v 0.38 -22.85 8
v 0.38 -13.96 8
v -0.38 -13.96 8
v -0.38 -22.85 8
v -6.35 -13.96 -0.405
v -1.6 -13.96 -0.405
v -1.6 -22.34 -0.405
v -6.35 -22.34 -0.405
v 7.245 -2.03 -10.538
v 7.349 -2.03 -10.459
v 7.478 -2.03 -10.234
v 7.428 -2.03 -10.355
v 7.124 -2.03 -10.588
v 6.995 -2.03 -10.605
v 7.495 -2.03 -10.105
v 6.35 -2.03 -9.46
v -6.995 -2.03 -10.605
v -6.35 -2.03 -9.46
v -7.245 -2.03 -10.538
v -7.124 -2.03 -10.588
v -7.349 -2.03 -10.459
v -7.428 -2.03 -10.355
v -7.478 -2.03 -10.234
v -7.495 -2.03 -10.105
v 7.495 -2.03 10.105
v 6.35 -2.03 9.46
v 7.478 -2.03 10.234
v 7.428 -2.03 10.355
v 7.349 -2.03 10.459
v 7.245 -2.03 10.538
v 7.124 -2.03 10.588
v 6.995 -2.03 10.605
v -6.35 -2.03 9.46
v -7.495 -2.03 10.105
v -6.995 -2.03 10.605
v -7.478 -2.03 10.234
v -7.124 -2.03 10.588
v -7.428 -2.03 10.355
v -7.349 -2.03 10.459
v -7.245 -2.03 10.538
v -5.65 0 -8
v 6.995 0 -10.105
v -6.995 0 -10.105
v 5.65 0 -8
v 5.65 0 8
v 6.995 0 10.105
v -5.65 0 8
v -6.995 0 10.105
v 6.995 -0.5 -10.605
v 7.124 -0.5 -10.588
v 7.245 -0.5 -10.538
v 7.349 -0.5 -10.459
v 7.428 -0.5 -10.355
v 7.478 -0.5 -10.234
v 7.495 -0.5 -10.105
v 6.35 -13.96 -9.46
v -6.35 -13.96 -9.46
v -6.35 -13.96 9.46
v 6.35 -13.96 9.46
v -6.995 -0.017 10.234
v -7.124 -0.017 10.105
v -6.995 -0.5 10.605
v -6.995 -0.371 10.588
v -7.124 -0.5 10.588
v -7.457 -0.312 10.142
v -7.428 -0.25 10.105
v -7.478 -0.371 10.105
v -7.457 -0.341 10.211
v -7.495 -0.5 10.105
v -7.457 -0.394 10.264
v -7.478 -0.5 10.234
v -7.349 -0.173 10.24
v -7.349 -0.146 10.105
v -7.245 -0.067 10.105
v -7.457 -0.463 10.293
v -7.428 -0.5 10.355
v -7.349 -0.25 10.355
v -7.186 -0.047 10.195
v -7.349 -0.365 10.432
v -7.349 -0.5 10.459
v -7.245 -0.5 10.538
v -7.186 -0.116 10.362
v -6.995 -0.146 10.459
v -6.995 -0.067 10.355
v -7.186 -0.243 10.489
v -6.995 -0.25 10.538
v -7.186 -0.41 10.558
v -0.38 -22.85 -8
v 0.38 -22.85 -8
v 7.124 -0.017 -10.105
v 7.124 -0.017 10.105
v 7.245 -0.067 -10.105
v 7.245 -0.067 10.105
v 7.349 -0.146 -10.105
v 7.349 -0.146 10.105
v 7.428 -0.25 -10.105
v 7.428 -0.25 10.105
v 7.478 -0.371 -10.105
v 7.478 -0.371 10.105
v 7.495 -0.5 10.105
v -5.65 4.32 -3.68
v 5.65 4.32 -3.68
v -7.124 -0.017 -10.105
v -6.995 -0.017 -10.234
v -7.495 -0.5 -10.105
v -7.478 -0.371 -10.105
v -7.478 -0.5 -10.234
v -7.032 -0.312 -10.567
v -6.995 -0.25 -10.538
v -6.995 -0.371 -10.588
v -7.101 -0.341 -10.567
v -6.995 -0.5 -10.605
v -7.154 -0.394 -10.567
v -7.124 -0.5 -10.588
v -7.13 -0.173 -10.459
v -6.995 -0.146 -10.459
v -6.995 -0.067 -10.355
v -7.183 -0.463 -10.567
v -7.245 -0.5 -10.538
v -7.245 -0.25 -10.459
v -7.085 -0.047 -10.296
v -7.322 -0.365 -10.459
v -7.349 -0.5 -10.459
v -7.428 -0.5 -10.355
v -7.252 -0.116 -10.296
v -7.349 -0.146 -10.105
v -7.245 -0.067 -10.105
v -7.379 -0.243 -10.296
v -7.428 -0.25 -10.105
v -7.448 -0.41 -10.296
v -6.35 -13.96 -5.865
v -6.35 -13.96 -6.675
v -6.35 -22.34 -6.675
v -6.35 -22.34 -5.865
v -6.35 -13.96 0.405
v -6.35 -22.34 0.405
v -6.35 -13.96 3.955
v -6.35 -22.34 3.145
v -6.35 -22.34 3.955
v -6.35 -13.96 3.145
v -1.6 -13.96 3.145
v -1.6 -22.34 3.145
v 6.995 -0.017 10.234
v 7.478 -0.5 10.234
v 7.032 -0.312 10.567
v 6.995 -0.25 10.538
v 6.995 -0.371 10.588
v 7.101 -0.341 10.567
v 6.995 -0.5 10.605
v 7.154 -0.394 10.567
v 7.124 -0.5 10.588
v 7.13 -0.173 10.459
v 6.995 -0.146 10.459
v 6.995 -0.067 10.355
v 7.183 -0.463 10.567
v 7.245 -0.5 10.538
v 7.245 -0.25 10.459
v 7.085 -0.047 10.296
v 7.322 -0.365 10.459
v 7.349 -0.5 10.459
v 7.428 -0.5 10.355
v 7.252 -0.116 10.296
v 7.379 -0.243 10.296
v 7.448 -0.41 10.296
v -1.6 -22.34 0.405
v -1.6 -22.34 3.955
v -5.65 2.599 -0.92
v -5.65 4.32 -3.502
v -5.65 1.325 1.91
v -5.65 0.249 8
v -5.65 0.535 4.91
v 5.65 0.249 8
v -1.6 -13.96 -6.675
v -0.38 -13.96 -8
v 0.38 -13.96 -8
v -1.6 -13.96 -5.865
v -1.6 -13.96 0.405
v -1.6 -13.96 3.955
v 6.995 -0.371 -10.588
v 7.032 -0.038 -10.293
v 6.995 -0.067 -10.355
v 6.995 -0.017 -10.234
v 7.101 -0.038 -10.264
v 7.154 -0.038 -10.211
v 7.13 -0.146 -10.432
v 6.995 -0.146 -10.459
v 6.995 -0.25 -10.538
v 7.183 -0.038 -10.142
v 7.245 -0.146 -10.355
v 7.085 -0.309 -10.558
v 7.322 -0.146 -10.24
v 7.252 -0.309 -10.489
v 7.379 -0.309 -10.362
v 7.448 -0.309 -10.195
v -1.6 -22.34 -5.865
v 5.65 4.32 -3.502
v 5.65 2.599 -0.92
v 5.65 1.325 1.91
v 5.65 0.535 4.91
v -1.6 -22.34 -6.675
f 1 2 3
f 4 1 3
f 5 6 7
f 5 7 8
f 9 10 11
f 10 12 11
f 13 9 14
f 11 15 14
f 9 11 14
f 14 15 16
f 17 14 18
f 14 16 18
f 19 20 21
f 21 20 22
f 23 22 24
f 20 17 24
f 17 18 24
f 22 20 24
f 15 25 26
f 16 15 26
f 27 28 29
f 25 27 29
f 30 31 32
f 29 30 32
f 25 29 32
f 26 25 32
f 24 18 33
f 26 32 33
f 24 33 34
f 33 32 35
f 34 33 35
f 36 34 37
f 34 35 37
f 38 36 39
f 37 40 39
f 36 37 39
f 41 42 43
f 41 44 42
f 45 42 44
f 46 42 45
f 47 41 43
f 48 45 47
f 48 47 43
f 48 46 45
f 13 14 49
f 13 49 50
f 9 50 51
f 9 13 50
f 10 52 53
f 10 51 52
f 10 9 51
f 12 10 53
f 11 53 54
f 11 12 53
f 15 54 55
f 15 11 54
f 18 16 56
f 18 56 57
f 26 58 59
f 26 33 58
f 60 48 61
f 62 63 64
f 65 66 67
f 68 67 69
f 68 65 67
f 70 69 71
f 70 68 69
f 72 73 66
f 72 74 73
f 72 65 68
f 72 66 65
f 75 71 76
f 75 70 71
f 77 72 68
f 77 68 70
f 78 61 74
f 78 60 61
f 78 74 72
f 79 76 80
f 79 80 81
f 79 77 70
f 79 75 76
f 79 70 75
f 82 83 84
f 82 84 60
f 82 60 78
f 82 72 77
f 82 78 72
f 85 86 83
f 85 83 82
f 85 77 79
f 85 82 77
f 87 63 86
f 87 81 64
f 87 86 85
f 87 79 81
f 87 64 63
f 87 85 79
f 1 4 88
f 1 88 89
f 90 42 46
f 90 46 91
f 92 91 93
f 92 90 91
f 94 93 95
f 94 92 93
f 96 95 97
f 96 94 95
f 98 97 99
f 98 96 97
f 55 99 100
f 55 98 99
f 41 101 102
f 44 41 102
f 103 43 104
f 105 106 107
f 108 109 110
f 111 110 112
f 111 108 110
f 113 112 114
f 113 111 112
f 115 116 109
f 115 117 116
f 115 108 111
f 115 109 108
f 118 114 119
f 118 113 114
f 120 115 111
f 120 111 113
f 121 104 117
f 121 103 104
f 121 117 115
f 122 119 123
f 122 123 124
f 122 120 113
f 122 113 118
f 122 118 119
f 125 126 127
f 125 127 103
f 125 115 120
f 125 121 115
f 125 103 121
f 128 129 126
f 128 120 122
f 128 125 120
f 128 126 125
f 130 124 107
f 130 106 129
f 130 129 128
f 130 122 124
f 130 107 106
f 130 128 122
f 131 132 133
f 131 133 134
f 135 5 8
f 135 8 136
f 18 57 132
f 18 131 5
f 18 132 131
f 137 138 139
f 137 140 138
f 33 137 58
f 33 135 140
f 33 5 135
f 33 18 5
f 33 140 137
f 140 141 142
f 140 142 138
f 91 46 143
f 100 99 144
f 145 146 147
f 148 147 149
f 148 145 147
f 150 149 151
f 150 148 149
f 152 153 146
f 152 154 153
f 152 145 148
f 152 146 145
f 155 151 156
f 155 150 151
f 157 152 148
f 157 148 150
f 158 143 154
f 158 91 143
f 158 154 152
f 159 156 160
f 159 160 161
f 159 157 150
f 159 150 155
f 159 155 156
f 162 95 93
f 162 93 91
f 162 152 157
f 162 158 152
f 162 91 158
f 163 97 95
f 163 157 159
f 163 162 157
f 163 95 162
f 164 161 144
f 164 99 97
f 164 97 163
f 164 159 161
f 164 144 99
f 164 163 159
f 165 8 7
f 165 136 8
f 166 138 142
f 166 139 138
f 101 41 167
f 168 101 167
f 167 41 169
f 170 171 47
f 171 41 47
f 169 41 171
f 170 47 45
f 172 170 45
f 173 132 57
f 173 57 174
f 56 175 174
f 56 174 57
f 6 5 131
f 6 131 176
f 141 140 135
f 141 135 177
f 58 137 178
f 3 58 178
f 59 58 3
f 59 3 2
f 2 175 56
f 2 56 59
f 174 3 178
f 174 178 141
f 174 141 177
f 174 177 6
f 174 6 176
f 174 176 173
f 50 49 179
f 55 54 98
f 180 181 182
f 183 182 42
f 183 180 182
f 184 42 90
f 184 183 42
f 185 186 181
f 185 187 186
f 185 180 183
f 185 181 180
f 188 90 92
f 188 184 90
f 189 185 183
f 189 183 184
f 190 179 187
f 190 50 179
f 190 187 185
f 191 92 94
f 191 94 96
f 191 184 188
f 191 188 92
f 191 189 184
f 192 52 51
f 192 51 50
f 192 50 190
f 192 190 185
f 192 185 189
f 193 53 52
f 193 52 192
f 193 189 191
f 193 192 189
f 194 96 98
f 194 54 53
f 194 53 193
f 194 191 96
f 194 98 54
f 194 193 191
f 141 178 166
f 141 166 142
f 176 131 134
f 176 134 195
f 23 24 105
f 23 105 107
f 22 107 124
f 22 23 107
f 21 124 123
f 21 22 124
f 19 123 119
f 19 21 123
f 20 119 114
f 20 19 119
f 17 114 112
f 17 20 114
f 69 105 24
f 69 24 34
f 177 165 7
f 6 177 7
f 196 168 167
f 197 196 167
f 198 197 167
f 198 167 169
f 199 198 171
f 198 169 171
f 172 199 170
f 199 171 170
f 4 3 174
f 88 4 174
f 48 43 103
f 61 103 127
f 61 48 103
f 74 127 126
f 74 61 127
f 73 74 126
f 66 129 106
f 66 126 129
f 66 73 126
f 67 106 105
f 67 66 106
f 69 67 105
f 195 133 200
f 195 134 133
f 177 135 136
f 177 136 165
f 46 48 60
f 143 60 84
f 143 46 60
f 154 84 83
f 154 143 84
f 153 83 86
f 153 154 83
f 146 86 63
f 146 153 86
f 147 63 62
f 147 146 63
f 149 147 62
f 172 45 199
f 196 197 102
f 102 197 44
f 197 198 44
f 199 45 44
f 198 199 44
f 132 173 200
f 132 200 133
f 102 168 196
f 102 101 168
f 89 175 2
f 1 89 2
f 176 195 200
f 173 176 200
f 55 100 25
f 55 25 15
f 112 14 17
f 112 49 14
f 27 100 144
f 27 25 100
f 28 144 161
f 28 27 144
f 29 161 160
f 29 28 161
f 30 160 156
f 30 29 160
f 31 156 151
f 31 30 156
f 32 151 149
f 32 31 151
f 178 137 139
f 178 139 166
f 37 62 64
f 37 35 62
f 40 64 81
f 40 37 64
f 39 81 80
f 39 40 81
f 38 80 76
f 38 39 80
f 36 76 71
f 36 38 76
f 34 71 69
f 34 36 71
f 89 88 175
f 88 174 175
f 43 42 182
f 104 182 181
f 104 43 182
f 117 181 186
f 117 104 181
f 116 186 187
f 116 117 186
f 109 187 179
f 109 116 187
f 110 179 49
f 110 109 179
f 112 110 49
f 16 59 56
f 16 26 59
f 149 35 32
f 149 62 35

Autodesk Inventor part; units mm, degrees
ref_plane "YZ Plane" through (0, 0, 0) normal (1, 0, 0) x (0, 1, 0)
ref_plane "XZ Plane" through (0, 0, 0) normal (0, 1, 0) x (-1, 0, 0)
ref_plane "XY Plane" through (0, 0, 0) normal (0, 0, 1) x (1, 0, 0)
sketch "Sketch1" plane through (0, 0, 0) normal (0, 1, 0) x (-1, 0, 0)
  line L0 (7.495, 10.605) -> (-7.495, 10.605)
  line L1 (-7.495, 10.605) -> (-7.495, -10.605)
  line L2 (-7.495, -10.605) -> (7.495, -10.605)
  line L3 (7.495, -10.605) -> (7.495, 10.605)
  point P0 (0, 0)
  dimension "d0" = 14.99
  dimension "d1" = 7.495
  dimension "d2" = 21.21
  dimension "d3" = 10.605
extrude "Extrusion1" add sketch "Sketch1" against normal blind 2.03
sketch "Sketch2" plane through (0, -2.03, 0) normal (0, -1, 0) x (1, 0, 0)
  line L0 (-6.35, 9.46) -> (6.35, 9.46)
  line L1 (6.35, 9.46) -> (6.35, -9.46)
  line L2 (6.35, -9.46) -> (-6.35, -9.46)
  line L3 (-6.35, -9.46) -> (-6.35, 9.46)
  point P0 (0, 0)
  dimension "d6" = 12.7
  dimension "d7" = 6.35
  dimension "d8" = 18.92
  dimension "d9" = 9.46
extrude "Extrusion2" add sketch "Sketch2" along normal blind 11.93
sketch "Sketch3" plane through (0, -13.96, 0) normal (0, -1, 0) x (1, 0, 0)
  line L0 (-0.38, -8) -> (0.38, -8)
  line L1 (0.38, -8) -> (0.38, 8)
  line L2 (0.38, 8) -> (-0.38, 8)
  line L3 (-0.38, 8) -> (-0.38, -8)
  point P0 (0, 0)
  dimension "d12" = 0.76
  dimension "d13" = 0.38
  dimension "d14" = 16
  dimension "d15" = 8
extrude "Extrusion3" add sketch "Sketch3" along normal blind 8.89
fillet "Fillet1" radius 0.5 8 edges at (7.495, -1.015, -10.605) (7.495, 0, 0) (7.495, -1.015, 10.605) (0, 0, 10.605) (-7.495, -1.015, 10.605) (-7.495, 0, 0) (-7.495, -1.015, -10.605) (0, 0, -10.605)
sketch "Sketch4" plane through (0, -13.96, 0) normal (0, -1, 0) x (1, 0, 0)
  line L0 (-1.6, -6.675) -> (-6.35, -6.675)
  line L1 (-6.35, -6.675) -> (-6.35, -5.865)
  line L2 (-6.35, -5.865) -> (-1.6, -5.865)
  line L3 (-1.6, -5.865) -> (-1.6, -6.675)
  line L4 (-1.6, -0.405) -> (-6.35, -0.405)
  line L5 (-6.35, -0.405) -> (-6.35, 0.405)
  line L6 (-6.35, 0.405) -> (-1.6, 0.405)
  line L7 (-1.6, 0.405) -> (-1.6, -0.405)
  line L8 (-1.6, 3.145) -> (-6.35, 3.145)
  line L9 (-6.35, 3.145) -> (-6.35, 3.955)
  line L10 (-6.35, 3.955) -> (-1.6, 3.955)
  line L11 (-1.6, 3.955) -> (-1.6, 3.145)
  line L12 (-6.35, 9.46) -> (-6.35, -9.46) projected
  point P0 (0, 0)
  dimension "d19" = 0
  dimension "d20" = 4.75
  dimension "d21" = 4.75
  dimension "d22" = 0.81
  dimension "d23" = 0.81
  dimension "d24" = 0.81
  dimension "d25" = 5.46
  dimension "d26" = 2.74
  dimension "d28" = 0.405
extrude "Extrusion4" add sketch "Sketch4" along normal blind 8.38
sketch "Sketch5" plane through (0, 0, 0) normal (0, 1, 0) x (1, 0, 0)
  line L0 (5.65, 8) -> (-5.65, 8)
  line L1 (-5.65, 8) -> (-5.65, -8)
  line L2 (-5.65, -8) -> (5.65, -8)
  line L3 (5.65, -8) -> (5.65, 8)
  point P0 (0, 0)
  dimension "d31" = 16
  dimension "d32" = 8
  dimension "d33" = 11.3
  dimension "d34" = 5.65
extrude "Extrusion5" add sketch "Sketch5" along normal blind 4.32
sketch "Sketch7" plane through (-5.65, 0, 8) normal (-1, 0, 0) x (0, 0, 1)
  circle A0 centre (0.1807, 19.0432) radius 18.7949
  point P0 (-8, 0)
extrude "Extrusion7" cut sketch "Sketch7" along normal through all both and the other way through all
chamfer "Chamfer1" distance 4.32 angle 45 1 edges at (0, 4.32, -8) measured on face at (1.8833, 2.88, -8)
properties part number "GRSV-4011-0137_RockerSwitch"
